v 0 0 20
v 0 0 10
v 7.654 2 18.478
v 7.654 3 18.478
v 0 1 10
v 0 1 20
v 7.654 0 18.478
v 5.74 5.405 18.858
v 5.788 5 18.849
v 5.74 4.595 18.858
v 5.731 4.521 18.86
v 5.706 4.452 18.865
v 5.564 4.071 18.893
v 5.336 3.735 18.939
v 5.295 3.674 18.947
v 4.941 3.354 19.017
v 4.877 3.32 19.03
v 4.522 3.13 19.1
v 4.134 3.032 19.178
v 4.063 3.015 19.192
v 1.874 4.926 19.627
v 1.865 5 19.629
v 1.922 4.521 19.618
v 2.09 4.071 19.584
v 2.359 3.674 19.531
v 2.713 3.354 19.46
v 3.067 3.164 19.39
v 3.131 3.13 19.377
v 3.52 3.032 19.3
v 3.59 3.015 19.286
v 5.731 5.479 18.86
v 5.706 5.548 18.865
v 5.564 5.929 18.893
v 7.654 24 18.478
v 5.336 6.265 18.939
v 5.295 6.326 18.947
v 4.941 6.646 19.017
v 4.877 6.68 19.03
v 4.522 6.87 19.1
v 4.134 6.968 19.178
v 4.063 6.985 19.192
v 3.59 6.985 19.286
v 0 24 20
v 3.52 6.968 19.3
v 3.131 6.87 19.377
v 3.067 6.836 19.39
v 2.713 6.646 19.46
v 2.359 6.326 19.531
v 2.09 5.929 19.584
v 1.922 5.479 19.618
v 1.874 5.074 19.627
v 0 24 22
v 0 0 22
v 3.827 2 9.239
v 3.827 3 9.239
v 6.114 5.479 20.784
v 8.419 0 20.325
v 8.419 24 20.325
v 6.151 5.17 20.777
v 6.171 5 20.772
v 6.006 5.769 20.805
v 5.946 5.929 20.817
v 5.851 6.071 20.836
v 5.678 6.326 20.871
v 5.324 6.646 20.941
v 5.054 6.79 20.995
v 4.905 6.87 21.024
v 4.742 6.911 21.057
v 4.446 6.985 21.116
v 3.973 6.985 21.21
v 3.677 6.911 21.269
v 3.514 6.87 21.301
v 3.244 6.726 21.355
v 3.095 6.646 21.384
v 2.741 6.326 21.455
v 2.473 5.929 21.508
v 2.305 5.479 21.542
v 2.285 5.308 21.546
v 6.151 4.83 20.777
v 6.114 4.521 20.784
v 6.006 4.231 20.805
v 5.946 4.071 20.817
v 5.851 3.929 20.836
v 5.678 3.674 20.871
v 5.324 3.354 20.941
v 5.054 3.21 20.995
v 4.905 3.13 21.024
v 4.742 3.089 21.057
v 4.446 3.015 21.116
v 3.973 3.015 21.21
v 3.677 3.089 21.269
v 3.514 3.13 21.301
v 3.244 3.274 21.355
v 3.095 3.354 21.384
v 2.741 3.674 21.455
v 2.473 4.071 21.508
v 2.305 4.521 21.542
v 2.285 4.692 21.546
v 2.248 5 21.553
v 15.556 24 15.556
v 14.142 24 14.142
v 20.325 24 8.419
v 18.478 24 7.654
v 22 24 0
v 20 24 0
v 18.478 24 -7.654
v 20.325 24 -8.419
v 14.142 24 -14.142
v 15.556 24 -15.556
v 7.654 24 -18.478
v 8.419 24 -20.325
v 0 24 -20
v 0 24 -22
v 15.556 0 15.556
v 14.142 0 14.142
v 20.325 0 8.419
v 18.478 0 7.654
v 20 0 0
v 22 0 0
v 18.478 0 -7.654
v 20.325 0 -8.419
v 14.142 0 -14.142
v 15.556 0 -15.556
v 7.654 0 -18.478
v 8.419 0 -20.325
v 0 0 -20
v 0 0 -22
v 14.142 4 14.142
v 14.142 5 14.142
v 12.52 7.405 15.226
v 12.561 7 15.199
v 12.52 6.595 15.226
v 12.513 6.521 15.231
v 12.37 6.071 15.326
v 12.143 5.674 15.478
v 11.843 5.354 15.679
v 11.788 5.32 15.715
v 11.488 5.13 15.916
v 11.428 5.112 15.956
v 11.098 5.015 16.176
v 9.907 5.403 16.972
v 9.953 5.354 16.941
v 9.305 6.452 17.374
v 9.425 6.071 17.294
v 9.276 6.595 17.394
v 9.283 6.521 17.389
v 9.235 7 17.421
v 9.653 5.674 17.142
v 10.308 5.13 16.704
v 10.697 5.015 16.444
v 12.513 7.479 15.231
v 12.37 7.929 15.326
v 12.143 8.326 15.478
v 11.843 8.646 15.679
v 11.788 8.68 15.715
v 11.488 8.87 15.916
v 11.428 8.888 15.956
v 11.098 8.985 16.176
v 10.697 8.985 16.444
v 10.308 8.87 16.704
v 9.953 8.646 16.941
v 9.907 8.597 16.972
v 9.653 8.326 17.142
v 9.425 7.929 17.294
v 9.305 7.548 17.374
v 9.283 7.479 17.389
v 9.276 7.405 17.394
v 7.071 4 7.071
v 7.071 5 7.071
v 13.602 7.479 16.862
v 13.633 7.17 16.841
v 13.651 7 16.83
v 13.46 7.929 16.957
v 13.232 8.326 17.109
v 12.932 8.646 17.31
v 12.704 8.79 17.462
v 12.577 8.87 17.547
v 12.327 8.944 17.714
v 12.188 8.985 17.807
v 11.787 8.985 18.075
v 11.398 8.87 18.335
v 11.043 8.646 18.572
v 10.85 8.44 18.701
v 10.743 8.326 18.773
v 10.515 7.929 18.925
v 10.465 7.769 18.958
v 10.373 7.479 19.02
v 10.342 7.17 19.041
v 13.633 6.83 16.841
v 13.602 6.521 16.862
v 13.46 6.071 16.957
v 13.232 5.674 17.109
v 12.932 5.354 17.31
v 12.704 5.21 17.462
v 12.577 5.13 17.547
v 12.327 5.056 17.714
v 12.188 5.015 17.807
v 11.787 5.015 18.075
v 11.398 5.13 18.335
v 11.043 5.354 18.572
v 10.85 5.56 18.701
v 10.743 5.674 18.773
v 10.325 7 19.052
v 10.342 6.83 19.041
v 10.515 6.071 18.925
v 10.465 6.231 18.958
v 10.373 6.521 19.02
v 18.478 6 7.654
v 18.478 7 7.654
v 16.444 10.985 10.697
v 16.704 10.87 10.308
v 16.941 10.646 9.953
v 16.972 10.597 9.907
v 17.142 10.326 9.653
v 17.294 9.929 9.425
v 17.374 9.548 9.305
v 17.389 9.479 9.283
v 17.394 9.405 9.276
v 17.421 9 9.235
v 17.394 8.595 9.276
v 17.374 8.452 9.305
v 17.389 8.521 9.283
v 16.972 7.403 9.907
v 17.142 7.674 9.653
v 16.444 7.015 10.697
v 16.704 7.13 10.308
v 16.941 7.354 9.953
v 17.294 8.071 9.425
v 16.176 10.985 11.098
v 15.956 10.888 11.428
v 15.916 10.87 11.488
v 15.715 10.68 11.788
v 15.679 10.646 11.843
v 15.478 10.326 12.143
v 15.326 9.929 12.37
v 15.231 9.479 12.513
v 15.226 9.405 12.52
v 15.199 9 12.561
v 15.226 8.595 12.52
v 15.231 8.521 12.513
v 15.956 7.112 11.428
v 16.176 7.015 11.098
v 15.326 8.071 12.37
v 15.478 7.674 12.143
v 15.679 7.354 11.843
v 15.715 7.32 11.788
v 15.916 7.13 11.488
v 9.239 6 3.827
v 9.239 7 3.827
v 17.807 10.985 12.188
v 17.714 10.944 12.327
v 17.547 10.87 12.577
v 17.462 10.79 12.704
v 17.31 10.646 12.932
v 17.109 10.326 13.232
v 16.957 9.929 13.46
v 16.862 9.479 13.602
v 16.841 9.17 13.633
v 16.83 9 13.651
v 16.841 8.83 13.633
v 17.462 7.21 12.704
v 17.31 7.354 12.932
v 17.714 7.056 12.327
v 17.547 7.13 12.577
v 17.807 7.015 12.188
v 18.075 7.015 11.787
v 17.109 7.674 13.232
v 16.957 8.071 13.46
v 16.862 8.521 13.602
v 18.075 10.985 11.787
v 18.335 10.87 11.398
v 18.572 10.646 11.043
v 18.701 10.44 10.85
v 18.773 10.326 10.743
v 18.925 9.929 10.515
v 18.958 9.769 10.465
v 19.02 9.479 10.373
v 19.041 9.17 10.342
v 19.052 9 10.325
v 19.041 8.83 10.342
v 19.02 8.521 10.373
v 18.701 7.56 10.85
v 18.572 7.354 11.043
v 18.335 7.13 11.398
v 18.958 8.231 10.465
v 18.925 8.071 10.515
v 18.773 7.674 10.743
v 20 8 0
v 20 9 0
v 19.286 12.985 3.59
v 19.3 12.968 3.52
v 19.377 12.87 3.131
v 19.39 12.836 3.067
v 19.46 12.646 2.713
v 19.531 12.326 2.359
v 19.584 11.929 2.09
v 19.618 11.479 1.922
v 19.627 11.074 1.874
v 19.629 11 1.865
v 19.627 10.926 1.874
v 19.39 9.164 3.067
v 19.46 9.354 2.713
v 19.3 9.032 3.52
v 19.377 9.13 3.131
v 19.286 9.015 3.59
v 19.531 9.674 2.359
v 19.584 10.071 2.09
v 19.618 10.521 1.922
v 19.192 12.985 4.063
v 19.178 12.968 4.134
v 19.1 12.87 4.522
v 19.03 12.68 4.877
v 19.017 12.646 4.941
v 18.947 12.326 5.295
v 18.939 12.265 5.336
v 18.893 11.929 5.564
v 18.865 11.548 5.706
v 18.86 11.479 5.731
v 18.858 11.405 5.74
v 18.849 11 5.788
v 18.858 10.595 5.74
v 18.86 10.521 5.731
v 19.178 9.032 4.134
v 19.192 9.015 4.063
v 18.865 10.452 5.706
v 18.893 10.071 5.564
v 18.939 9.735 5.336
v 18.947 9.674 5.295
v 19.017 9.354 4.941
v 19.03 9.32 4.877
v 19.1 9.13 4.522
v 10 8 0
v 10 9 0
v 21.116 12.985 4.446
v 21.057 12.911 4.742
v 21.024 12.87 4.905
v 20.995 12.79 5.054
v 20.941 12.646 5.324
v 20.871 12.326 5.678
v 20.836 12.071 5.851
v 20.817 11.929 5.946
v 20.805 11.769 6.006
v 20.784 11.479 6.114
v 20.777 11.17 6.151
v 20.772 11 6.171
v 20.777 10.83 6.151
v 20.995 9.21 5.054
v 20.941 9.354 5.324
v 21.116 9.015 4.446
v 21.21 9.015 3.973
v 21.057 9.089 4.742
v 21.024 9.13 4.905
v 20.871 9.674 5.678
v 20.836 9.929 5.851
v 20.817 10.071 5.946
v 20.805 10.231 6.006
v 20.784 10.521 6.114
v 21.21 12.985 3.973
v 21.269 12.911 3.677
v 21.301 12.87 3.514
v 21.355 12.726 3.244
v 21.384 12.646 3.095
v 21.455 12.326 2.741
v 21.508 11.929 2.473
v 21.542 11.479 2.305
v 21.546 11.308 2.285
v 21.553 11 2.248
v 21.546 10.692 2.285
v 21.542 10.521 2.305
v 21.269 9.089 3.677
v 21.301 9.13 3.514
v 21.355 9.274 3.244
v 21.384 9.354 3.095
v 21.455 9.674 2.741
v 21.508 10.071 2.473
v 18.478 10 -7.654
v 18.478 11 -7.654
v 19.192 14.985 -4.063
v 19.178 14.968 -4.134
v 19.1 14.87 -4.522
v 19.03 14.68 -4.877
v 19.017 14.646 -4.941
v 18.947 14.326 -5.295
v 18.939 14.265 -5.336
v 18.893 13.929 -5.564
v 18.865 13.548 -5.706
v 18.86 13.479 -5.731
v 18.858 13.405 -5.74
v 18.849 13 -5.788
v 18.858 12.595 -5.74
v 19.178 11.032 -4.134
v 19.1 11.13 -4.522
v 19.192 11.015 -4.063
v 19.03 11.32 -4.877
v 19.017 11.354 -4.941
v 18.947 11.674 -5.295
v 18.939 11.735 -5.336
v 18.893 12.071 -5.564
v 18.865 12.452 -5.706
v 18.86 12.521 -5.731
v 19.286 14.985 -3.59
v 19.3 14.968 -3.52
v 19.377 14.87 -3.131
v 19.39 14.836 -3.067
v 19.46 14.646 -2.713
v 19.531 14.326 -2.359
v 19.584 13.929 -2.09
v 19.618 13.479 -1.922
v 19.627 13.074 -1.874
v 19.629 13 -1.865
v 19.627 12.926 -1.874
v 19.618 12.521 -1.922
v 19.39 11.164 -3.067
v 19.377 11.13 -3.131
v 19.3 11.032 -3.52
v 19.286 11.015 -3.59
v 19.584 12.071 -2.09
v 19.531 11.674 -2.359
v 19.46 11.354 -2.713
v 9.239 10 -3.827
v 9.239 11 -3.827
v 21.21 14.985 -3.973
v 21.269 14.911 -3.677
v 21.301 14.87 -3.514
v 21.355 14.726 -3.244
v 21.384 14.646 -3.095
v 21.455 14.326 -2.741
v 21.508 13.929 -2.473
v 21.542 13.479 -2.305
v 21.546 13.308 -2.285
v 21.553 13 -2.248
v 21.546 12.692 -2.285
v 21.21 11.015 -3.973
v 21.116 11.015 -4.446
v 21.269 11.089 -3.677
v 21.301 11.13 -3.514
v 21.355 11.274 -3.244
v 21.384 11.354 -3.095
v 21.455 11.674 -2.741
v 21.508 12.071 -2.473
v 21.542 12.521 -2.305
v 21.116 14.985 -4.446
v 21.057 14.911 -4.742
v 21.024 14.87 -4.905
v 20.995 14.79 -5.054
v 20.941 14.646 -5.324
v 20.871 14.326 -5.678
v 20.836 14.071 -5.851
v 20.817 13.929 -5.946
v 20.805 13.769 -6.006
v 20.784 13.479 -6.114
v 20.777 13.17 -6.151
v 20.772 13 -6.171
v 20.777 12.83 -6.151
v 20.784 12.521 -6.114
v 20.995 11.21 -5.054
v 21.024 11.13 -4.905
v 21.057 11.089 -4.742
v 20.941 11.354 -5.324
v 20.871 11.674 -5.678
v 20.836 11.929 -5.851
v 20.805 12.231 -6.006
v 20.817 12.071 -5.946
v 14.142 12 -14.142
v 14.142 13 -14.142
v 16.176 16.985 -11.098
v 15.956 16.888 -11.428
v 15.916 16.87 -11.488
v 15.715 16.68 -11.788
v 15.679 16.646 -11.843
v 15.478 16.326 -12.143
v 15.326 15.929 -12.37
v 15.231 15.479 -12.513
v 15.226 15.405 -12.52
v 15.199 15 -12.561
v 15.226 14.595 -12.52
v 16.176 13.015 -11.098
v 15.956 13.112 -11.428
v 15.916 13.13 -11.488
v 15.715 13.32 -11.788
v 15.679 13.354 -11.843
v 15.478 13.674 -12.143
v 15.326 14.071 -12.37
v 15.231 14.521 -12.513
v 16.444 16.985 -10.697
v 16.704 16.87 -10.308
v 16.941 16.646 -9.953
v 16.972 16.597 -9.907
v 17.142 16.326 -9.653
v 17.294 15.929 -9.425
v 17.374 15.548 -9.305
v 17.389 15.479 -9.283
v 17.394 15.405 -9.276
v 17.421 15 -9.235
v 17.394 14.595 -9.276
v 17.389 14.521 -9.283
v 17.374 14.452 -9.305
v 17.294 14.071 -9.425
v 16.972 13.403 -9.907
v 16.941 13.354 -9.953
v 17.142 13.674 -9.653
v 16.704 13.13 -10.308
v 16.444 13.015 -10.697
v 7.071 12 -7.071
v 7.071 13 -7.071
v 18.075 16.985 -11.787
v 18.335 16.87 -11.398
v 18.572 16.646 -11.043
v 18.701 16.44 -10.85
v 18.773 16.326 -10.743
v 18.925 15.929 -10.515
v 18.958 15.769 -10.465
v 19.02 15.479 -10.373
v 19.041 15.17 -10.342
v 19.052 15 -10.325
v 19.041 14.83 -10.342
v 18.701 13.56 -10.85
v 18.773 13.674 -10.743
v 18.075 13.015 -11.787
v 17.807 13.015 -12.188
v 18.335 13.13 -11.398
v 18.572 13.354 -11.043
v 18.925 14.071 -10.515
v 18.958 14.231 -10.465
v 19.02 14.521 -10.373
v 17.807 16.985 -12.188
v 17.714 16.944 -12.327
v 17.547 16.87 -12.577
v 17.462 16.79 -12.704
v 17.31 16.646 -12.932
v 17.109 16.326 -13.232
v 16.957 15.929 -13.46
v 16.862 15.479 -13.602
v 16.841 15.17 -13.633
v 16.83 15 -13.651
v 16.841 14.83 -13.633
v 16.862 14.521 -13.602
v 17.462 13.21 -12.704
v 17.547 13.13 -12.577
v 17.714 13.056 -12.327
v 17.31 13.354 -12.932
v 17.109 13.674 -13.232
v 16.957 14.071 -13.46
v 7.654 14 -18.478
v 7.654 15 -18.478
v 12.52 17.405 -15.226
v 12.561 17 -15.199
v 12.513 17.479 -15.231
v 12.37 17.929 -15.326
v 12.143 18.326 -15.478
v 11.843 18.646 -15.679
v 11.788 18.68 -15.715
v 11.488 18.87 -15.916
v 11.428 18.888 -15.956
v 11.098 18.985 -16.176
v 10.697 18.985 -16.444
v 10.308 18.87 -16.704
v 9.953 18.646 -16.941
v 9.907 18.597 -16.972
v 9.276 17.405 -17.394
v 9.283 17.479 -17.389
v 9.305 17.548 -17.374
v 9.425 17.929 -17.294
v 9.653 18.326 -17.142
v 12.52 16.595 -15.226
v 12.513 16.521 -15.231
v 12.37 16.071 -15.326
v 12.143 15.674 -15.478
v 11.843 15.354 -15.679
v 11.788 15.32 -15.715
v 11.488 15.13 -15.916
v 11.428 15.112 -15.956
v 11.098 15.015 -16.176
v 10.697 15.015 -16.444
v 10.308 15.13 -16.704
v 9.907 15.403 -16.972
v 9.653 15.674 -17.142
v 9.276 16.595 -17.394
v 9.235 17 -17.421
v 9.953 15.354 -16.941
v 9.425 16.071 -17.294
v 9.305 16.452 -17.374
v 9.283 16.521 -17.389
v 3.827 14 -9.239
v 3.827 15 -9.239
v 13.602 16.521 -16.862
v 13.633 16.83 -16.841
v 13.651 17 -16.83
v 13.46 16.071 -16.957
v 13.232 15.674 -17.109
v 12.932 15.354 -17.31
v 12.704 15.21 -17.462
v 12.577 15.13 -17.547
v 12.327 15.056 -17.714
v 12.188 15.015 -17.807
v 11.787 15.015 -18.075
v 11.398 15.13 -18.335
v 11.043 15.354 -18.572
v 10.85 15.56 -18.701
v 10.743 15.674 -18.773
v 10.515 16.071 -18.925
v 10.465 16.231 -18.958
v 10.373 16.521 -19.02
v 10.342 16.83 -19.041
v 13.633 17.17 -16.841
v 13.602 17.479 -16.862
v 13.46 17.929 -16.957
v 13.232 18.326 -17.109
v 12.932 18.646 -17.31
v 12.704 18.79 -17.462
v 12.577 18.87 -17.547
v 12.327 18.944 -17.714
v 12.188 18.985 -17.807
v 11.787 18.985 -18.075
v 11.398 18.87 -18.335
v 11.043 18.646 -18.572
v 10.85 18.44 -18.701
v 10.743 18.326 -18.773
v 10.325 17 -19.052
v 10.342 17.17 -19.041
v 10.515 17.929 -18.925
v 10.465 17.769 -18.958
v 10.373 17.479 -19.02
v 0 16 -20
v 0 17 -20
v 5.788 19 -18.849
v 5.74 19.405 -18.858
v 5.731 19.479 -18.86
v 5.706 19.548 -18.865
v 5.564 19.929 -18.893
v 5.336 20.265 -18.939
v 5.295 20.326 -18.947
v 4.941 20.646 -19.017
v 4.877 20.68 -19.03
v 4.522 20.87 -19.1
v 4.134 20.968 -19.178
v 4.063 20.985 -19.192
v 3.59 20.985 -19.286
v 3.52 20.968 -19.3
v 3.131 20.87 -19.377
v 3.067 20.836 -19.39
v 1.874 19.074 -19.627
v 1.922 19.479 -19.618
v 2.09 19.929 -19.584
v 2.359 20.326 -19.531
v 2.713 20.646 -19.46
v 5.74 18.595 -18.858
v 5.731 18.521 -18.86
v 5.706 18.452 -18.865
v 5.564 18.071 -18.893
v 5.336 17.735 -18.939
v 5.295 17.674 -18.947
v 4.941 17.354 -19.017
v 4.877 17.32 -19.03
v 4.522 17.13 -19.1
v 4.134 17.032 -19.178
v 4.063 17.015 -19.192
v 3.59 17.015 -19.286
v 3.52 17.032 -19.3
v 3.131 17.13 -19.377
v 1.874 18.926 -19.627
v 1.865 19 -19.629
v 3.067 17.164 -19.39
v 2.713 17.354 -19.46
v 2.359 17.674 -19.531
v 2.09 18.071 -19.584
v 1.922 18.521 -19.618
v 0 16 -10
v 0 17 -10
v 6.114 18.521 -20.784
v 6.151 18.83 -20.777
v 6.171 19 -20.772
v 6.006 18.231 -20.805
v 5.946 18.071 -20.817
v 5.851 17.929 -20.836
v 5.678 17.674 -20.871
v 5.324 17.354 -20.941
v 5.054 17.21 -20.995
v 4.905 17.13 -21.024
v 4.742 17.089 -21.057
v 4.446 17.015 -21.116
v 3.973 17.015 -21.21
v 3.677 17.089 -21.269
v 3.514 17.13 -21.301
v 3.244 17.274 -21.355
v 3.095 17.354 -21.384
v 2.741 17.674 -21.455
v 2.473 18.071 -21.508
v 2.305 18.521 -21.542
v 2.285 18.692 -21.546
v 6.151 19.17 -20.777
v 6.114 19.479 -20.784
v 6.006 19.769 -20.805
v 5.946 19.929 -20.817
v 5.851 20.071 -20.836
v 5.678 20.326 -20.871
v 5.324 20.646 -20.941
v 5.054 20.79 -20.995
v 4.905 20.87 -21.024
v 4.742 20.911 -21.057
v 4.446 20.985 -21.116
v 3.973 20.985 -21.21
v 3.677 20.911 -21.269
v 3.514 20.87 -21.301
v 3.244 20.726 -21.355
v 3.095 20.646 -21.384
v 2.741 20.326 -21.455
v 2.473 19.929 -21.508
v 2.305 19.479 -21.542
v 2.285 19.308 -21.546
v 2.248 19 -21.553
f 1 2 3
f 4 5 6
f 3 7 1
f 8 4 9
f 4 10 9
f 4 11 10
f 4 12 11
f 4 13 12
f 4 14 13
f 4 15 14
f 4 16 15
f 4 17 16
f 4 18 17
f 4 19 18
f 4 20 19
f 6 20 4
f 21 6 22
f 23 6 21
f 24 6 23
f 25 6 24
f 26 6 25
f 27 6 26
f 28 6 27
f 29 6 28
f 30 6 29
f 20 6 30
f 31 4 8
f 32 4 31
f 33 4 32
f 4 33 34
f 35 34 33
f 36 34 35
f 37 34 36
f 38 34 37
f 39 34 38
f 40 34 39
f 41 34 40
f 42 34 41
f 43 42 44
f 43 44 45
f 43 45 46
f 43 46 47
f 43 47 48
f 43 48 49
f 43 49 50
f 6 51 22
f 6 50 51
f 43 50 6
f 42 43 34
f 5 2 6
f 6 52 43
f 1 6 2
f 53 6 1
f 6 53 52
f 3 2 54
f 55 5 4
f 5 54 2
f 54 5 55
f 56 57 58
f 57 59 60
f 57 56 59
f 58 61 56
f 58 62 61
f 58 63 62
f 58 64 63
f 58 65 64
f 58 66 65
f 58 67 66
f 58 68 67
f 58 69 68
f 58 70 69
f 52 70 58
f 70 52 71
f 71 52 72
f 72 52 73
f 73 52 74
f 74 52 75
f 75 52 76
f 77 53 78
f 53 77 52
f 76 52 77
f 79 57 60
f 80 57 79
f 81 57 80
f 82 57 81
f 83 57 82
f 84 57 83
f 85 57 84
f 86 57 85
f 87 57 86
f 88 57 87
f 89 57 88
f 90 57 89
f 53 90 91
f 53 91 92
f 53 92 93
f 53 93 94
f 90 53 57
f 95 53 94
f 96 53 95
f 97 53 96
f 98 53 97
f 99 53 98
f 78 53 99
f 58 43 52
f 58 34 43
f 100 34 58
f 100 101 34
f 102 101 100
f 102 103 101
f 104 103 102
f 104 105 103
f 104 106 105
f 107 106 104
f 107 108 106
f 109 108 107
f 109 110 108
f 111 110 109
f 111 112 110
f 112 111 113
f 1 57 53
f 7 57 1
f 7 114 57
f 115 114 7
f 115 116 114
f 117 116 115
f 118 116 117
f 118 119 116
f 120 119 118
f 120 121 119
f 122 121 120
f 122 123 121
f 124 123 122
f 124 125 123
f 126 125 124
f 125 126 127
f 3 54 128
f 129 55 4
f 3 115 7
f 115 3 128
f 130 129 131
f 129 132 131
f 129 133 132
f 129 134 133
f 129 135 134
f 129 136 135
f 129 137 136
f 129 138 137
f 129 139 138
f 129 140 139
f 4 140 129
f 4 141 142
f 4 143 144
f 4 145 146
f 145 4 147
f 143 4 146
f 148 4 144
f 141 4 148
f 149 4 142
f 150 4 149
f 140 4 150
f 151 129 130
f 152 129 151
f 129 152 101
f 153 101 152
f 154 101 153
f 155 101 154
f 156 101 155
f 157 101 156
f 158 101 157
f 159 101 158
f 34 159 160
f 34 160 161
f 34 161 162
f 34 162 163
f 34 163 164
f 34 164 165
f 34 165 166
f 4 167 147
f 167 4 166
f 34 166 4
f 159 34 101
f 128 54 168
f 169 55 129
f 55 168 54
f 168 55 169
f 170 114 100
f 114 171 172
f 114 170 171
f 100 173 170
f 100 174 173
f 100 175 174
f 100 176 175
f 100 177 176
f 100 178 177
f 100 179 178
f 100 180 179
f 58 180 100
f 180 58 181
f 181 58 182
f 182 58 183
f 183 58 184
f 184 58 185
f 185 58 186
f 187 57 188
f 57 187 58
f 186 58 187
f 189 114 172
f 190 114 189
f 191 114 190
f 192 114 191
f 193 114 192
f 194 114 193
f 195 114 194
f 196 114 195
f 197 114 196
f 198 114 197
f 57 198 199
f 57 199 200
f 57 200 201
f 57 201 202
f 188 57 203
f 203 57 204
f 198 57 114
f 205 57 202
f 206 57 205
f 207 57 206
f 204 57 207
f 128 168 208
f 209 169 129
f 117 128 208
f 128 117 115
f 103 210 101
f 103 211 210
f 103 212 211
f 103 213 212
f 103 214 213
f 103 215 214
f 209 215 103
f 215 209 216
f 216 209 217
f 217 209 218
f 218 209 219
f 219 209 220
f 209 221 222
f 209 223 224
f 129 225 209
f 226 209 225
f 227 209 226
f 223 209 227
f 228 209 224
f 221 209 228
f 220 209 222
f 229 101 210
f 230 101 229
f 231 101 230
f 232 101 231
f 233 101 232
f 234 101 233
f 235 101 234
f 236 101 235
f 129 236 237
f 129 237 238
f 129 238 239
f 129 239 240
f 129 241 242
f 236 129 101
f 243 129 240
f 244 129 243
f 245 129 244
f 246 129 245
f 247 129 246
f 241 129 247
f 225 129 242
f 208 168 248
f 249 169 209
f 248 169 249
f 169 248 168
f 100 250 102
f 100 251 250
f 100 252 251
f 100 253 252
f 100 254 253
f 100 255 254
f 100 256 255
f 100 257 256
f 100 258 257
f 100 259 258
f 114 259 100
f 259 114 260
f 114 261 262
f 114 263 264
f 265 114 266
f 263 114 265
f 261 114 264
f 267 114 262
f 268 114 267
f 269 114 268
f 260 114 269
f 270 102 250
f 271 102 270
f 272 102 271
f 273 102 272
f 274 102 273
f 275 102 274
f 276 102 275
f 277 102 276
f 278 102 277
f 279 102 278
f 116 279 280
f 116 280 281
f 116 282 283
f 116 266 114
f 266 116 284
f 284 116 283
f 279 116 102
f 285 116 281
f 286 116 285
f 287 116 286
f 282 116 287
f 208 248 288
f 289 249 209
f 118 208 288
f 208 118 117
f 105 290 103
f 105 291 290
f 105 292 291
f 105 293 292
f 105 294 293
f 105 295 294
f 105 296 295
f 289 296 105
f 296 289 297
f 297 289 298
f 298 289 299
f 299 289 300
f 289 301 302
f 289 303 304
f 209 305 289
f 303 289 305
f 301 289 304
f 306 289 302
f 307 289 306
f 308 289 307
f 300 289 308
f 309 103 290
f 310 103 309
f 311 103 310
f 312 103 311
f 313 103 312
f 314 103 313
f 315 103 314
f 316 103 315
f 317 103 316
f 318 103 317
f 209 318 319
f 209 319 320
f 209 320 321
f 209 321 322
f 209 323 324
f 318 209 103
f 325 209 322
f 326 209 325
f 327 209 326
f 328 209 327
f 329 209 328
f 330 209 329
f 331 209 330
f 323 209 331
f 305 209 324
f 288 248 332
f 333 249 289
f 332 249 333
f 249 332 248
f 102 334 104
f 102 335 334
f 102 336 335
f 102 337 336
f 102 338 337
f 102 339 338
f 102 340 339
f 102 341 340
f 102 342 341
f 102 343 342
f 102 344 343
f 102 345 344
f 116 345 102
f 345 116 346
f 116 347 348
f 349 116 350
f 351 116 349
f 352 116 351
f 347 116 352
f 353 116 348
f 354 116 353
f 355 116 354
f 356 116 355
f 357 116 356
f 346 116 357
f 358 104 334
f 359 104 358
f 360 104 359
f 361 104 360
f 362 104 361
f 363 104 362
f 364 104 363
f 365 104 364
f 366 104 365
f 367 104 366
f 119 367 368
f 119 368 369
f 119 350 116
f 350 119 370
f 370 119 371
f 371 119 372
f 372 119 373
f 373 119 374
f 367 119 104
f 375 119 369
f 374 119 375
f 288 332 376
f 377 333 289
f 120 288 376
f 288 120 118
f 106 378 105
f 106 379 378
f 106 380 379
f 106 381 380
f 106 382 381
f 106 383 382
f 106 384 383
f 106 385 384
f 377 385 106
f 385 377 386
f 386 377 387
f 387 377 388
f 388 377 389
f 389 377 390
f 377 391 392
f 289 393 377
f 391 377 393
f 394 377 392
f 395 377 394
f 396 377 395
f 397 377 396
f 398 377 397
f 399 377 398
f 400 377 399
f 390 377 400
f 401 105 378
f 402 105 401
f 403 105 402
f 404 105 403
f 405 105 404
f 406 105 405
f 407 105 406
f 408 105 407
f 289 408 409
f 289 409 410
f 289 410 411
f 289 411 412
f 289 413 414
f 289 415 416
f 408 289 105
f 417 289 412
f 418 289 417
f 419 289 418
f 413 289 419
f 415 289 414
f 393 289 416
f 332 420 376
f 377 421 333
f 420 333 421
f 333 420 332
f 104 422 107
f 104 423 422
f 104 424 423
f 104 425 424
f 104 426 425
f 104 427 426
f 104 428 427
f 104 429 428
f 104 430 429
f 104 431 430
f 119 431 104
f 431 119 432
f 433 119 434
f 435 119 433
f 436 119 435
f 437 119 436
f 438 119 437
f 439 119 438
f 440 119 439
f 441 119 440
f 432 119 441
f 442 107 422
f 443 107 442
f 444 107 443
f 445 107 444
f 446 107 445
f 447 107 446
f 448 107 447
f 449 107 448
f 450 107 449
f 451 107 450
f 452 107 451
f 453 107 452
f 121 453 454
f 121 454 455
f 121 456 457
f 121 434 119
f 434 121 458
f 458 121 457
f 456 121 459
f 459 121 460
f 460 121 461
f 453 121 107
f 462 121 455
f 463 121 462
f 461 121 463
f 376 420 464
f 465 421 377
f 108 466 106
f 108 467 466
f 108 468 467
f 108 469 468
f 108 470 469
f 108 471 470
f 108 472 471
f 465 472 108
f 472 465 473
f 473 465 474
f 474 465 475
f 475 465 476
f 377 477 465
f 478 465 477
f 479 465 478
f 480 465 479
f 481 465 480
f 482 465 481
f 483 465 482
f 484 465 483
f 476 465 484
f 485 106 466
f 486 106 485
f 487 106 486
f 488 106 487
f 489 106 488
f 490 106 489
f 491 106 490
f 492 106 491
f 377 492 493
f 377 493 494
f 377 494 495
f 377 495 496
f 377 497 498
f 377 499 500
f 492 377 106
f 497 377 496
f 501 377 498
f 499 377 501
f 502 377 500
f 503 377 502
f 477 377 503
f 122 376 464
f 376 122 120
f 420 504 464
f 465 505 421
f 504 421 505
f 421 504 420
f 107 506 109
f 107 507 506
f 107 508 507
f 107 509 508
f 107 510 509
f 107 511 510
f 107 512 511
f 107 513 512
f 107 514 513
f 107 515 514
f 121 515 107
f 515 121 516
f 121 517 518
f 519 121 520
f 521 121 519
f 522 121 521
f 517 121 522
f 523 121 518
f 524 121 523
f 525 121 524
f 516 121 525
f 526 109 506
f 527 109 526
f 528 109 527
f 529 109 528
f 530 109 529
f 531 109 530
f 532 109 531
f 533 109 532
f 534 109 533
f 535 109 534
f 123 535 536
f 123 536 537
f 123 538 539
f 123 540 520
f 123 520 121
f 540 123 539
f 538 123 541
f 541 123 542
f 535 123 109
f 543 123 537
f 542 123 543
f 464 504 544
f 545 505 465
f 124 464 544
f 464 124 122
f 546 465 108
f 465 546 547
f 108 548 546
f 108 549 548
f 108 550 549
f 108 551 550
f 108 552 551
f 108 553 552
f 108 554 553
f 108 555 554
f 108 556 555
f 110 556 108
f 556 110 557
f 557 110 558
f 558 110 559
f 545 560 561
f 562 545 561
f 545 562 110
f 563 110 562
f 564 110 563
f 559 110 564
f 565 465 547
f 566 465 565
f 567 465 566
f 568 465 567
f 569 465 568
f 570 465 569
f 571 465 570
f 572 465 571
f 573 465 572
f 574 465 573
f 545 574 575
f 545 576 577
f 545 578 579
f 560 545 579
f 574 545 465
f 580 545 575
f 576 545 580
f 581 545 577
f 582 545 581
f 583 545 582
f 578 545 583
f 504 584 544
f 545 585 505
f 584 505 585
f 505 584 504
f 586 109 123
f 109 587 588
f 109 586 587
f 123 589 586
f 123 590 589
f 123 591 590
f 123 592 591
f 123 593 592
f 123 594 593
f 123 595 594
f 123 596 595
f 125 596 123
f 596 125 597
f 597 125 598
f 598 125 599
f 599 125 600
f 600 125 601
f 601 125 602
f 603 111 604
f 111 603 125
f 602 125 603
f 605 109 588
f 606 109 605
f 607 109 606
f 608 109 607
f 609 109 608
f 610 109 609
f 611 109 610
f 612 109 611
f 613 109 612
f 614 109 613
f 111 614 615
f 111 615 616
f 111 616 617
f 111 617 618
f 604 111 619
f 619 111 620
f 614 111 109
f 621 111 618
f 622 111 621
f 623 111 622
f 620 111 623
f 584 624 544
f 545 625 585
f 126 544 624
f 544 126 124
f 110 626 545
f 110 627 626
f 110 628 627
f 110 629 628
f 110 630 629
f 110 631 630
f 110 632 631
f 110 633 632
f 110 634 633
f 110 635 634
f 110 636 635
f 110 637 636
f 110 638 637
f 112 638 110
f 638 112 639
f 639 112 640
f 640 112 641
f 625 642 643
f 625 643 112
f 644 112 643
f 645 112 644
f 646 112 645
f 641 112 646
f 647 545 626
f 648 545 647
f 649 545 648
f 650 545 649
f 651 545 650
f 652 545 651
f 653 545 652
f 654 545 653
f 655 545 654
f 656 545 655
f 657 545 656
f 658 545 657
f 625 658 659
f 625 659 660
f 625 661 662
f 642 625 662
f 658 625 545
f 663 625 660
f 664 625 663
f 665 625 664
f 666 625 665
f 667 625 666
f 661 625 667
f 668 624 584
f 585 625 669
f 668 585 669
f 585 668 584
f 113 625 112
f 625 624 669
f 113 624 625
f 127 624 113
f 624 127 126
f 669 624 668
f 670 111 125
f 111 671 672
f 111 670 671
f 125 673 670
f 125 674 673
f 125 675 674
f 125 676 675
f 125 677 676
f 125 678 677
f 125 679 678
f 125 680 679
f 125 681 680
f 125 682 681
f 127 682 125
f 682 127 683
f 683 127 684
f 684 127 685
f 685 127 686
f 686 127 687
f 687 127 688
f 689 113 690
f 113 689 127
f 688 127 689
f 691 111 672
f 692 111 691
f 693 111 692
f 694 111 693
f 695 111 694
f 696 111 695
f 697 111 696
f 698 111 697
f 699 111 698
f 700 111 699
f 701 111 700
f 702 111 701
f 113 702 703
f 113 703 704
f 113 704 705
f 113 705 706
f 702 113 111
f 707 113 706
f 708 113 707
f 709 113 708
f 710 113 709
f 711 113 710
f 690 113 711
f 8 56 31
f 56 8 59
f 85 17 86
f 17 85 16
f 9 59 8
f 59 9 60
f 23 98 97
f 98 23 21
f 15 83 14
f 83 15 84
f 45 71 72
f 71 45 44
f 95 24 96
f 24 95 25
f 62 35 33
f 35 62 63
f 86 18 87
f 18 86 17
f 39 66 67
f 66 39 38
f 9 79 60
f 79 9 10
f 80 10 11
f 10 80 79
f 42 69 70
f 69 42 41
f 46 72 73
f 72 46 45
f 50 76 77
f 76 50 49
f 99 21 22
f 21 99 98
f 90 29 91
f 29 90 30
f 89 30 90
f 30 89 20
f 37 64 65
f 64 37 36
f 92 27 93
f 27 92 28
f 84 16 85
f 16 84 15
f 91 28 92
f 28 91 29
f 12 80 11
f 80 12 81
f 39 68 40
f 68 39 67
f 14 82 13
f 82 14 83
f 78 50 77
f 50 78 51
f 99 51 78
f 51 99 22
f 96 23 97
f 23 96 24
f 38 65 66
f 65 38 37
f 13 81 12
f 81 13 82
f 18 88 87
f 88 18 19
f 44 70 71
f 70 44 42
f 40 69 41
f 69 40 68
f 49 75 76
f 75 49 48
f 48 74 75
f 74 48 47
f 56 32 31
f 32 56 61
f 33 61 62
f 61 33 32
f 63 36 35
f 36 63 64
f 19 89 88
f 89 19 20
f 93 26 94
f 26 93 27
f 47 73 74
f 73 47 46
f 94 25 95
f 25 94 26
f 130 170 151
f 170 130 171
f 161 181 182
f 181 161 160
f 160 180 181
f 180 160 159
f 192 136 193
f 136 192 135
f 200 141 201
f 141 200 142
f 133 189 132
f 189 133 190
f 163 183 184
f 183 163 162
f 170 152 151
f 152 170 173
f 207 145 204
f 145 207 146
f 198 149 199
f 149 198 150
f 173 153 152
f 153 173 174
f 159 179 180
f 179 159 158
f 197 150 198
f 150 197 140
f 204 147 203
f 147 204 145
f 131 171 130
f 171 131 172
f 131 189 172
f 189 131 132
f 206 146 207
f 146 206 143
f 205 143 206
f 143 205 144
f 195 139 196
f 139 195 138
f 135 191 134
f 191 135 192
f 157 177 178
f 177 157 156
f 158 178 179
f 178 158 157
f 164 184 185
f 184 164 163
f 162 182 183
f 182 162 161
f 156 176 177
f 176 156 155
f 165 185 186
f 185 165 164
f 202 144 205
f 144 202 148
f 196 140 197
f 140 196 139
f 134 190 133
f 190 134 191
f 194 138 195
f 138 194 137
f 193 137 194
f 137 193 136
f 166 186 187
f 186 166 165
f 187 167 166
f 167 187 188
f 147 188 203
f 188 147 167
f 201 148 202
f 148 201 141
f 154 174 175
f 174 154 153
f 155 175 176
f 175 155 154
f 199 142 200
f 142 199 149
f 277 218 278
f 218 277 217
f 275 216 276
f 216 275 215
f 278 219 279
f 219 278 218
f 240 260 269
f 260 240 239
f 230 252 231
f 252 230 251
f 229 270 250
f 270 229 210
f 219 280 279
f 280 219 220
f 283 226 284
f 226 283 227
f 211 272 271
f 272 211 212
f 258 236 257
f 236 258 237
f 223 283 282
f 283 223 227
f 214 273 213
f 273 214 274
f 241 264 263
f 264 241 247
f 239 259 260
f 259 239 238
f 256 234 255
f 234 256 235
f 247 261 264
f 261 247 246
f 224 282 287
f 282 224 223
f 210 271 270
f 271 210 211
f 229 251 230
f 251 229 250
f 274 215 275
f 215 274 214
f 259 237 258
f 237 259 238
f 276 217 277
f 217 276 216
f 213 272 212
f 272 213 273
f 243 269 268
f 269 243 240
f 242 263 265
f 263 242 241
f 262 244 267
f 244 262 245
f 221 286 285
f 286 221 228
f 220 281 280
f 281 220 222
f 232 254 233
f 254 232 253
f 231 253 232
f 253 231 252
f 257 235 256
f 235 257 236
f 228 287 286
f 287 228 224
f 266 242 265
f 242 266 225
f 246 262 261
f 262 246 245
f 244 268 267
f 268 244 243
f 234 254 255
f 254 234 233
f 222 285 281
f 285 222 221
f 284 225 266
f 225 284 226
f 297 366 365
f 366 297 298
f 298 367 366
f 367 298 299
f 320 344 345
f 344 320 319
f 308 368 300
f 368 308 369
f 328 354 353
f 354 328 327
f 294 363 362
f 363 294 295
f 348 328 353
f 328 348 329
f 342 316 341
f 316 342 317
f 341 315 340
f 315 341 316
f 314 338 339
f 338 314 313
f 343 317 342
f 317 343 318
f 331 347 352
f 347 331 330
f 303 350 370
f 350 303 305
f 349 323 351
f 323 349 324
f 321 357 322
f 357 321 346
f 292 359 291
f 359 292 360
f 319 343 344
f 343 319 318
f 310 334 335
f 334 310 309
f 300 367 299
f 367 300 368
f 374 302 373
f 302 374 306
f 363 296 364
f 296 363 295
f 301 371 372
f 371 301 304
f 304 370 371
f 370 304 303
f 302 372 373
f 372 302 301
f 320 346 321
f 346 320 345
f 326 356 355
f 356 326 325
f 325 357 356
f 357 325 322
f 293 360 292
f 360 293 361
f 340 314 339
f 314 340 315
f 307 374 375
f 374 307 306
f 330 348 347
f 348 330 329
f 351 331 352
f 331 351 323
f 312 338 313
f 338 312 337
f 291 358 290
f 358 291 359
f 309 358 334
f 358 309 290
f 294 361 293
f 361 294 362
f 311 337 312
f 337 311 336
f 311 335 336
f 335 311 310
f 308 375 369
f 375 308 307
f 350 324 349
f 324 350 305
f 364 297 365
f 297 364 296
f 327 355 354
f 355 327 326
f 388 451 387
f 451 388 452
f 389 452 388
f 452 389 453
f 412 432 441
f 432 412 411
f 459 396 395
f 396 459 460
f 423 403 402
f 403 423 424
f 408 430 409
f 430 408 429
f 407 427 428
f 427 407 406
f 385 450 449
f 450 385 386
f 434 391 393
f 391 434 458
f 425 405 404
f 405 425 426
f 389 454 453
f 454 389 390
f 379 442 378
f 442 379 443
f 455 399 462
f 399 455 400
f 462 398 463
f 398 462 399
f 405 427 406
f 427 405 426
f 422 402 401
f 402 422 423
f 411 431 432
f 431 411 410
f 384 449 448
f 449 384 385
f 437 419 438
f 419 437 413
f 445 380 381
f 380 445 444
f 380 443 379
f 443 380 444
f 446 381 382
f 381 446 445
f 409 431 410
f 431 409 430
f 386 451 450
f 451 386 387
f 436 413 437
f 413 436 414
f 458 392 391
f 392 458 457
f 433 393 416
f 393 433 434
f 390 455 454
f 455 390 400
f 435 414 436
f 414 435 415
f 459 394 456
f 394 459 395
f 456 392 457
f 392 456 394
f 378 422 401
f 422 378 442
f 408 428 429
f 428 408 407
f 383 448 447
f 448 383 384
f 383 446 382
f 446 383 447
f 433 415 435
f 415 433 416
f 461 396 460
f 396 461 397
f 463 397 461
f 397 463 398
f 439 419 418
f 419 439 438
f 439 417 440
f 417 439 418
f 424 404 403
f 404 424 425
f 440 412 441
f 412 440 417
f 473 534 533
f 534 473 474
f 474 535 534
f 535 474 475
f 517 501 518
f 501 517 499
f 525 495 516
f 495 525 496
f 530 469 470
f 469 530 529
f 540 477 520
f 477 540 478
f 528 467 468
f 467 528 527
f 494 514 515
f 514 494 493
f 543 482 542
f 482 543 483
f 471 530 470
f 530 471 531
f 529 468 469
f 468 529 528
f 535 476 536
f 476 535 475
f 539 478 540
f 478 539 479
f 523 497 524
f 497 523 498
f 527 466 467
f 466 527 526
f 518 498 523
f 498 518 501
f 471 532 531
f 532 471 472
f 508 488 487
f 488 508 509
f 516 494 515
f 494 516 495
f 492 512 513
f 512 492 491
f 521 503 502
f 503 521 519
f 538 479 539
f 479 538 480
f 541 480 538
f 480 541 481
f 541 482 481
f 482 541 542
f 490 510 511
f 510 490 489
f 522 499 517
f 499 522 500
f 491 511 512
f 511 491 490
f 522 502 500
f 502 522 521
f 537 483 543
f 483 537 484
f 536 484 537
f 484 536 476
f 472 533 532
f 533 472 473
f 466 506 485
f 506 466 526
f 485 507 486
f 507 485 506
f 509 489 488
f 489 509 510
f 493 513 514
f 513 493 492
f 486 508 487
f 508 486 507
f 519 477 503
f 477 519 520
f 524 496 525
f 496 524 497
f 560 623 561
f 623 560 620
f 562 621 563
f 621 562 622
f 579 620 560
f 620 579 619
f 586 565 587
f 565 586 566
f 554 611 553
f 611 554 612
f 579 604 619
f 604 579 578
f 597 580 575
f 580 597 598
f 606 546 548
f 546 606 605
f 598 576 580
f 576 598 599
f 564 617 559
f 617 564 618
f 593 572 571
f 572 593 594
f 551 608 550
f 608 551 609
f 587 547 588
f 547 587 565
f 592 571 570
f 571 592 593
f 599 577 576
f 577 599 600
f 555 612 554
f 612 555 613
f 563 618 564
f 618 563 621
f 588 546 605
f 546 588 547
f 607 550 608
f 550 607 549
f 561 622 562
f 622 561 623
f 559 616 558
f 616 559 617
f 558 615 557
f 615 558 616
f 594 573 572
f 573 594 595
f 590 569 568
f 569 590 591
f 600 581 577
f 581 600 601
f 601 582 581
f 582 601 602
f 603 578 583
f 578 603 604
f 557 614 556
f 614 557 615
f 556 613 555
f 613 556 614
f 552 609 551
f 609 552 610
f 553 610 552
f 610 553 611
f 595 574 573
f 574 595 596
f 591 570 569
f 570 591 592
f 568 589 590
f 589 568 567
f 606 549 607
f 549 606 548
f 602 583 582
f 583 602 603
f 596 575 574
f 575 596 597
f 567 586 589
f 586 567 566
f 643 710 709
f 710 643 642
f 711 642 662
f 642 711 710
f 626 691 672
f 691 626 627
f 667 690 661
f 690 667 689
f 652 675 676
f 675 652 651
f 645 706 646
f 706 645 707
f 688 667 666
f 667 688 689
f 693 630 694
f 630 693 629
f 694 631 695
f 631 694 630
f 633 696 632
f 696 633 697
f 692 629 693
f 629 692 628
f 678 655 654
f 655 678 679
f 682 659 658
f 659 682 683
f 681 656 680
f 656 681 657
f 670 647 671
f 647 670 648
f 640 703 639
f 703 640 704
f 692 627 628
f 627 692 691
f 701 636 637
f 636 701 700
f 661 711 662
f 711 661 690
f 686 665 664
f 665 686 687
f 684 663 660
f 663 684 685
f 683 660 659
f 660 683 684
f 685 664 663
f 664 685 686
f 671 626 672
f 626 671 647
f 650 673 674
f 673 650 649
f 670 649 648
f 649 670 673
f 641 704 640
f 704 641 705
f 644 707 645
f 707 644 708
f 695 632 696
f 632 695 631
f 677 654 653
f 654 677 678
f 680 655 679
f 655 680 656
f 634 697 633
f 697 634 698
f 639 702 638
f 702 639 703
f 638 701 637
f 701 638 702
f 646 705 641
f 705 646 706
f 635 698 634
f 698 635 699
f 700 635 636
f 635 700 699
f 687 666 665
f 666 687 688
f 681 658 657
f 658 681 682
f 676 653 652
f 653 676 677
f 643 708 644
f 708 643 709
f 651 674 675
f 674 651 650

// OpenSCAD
//
//
//

module spiral_ramp_section(inner_radius = 10,
                           outer_radius = 20,
                           tower_radius = 22,
                           tower_height = 20,
                           angle_start = 0,
                           angle_sweep = 20,
                           y_start = 0,
                           y_rise = 2,
                           thickness = 1,
                           part = 0)
{
    // p0 and p1 are on the right of the ramp section
    p0x = inner_radius * sin(angle_start);
    p0y = y_start;
    p0z = inner_radius * cos(angle_start);

    p1x = outer_radius * sin(angle_start);
    p1y = y_start;
    p1z = outer_radius * cos(angle_start);

    // p2 and p3 are on the left of the ramp section
    p2x = outer_radius * sin(angle_start + angle_sweep);
    p2y = y_start + y_rise;
    p2z = outer_radius * cos(angle_start + angle_sweep);

    p3x = inner_radius * sin(angle_start + angle_sweep);
    p3y = y_start + y_rise;
    p3z = inner_radius * cos(angle_start + angle_sweep);


    // p4 and p5 are the outer edge of the wall
    p4x = tower_radius * sin(angle_start);
    p4y = 0;
    p4z = tower_radius * cos(angle_start);

    p5x = tower_radius * sin(angle_start + angle_sweep);
    p5y = 0;
    p5z = tower_radius * cos(angle_start + angle_sweep);

    section_points = [[p0x, p0y, p0z],
                      [p1x, p1y, p1z],
                      [p2x, p2y, p2z],
                      [p3x, p3y, p3z],
                      [p0x, p0y + thickness, p0z],
                      [p1x, p1y + thickness, p1z],
                      [p2x, p2y + thickness, p2z],
                      [p3x, p3y + thickness, p3z],
                      // outer wall
                      [p1x, 0, p1z],
                      [p2x, 0, p2z],
                      [p4x, 0, p4z],
                      [p5x, 0, p5z],
                      [p1x, tower_height, p1z],
                      [p2x, tower_height, p2z],
                      [p4x, tower_height, p4z],
                      [p5x, tower_height, p5z]
                      ];

    if (part == 0) {
        polyhedron(points=section_points,
                   faces=[[2, 1, 0], // bottom
                          [4, 5, 6], // top
                          [1, 2, 6, 5], // far
                          [4, 6, 2, 0], // center
                          [0, 1, 5, 4]] // right
                   );
    } else if (part == 1) {
        polyhedron(points=section_points,
                   faces=[[3, 2, 0], // bottom
                          [4, 6, 7], // top
                          [0, 4, 7, 3], // near
                          [0, 2, 6, 4], // center
                          [2, 3, 7, 6]] // left
                   );
    } else {
        polyhedron(points=section_points,
                   faces=[[8, 12, 13, 9], // near face
                          [10, 11, 15, 14], // far face
                          [12, 14, 15, 13], // top
                          [8, 9, 11, 10], // bottom
                          [8, 10, 14, 12], // right
                          [13, 15, 11, 9]] // left
                   );
    }
}


inner_radius = 10;
outer_radius = 20;
tower_radius = 22;
tower_height = 24;
angle_sweep = 22.5;
y_rise = 2;
thickness = 1;

combined = 1; // this can be overridden by the Makefile

if (combined == 1) {
    difference() {
        for(nth=[0:1:23]) {
            spiral_ramp_section(inner_radius = inner_radius,
                                outer_radius = outer_radius,
                                tower_radius = tower_radius,
                                tower_height = tower_height,
                                angle_start = floor( nth / 3.0 ) * angle_sweep,
                                angle_sweep = angle_sweep,
                                y_start = floor( nth / 3.0 ) * y_rise,
                                y_rise = y_rise,
                                thickness = thickness,
                                part = nth - floor( nth / 3.0 ) * 3);
        }
        for(nth=[0:1:7]) {
            rotate([0, angle_sweep * nth + angle_sweep / 2.0, 0])
                translate([0, y_rise * nth + y_rise + 3, outer_radius-1])
                cylinder(h=4, r=2, $fs=0.5);
        }
    }
} else {
    // do part of one pie-slice of the tower
    spiral_ramp_section(inner_radius = inner_radius,
                        outer_radius = outer_radius,
                        tower_radius = tower_radius,
                        tower_height = tower_height,
                        angle_start = floor( nth / 3.0 ) * angle_sweep,
                        angle_sweep = angle_sweep,
                        y_start = floor( nth / 3.0 ) * y_rise,
                        y_rise = y_rise,
                        thickness = thickness,
                        part = nth - floor( nth / 3.0 ) * 3.0);
}
